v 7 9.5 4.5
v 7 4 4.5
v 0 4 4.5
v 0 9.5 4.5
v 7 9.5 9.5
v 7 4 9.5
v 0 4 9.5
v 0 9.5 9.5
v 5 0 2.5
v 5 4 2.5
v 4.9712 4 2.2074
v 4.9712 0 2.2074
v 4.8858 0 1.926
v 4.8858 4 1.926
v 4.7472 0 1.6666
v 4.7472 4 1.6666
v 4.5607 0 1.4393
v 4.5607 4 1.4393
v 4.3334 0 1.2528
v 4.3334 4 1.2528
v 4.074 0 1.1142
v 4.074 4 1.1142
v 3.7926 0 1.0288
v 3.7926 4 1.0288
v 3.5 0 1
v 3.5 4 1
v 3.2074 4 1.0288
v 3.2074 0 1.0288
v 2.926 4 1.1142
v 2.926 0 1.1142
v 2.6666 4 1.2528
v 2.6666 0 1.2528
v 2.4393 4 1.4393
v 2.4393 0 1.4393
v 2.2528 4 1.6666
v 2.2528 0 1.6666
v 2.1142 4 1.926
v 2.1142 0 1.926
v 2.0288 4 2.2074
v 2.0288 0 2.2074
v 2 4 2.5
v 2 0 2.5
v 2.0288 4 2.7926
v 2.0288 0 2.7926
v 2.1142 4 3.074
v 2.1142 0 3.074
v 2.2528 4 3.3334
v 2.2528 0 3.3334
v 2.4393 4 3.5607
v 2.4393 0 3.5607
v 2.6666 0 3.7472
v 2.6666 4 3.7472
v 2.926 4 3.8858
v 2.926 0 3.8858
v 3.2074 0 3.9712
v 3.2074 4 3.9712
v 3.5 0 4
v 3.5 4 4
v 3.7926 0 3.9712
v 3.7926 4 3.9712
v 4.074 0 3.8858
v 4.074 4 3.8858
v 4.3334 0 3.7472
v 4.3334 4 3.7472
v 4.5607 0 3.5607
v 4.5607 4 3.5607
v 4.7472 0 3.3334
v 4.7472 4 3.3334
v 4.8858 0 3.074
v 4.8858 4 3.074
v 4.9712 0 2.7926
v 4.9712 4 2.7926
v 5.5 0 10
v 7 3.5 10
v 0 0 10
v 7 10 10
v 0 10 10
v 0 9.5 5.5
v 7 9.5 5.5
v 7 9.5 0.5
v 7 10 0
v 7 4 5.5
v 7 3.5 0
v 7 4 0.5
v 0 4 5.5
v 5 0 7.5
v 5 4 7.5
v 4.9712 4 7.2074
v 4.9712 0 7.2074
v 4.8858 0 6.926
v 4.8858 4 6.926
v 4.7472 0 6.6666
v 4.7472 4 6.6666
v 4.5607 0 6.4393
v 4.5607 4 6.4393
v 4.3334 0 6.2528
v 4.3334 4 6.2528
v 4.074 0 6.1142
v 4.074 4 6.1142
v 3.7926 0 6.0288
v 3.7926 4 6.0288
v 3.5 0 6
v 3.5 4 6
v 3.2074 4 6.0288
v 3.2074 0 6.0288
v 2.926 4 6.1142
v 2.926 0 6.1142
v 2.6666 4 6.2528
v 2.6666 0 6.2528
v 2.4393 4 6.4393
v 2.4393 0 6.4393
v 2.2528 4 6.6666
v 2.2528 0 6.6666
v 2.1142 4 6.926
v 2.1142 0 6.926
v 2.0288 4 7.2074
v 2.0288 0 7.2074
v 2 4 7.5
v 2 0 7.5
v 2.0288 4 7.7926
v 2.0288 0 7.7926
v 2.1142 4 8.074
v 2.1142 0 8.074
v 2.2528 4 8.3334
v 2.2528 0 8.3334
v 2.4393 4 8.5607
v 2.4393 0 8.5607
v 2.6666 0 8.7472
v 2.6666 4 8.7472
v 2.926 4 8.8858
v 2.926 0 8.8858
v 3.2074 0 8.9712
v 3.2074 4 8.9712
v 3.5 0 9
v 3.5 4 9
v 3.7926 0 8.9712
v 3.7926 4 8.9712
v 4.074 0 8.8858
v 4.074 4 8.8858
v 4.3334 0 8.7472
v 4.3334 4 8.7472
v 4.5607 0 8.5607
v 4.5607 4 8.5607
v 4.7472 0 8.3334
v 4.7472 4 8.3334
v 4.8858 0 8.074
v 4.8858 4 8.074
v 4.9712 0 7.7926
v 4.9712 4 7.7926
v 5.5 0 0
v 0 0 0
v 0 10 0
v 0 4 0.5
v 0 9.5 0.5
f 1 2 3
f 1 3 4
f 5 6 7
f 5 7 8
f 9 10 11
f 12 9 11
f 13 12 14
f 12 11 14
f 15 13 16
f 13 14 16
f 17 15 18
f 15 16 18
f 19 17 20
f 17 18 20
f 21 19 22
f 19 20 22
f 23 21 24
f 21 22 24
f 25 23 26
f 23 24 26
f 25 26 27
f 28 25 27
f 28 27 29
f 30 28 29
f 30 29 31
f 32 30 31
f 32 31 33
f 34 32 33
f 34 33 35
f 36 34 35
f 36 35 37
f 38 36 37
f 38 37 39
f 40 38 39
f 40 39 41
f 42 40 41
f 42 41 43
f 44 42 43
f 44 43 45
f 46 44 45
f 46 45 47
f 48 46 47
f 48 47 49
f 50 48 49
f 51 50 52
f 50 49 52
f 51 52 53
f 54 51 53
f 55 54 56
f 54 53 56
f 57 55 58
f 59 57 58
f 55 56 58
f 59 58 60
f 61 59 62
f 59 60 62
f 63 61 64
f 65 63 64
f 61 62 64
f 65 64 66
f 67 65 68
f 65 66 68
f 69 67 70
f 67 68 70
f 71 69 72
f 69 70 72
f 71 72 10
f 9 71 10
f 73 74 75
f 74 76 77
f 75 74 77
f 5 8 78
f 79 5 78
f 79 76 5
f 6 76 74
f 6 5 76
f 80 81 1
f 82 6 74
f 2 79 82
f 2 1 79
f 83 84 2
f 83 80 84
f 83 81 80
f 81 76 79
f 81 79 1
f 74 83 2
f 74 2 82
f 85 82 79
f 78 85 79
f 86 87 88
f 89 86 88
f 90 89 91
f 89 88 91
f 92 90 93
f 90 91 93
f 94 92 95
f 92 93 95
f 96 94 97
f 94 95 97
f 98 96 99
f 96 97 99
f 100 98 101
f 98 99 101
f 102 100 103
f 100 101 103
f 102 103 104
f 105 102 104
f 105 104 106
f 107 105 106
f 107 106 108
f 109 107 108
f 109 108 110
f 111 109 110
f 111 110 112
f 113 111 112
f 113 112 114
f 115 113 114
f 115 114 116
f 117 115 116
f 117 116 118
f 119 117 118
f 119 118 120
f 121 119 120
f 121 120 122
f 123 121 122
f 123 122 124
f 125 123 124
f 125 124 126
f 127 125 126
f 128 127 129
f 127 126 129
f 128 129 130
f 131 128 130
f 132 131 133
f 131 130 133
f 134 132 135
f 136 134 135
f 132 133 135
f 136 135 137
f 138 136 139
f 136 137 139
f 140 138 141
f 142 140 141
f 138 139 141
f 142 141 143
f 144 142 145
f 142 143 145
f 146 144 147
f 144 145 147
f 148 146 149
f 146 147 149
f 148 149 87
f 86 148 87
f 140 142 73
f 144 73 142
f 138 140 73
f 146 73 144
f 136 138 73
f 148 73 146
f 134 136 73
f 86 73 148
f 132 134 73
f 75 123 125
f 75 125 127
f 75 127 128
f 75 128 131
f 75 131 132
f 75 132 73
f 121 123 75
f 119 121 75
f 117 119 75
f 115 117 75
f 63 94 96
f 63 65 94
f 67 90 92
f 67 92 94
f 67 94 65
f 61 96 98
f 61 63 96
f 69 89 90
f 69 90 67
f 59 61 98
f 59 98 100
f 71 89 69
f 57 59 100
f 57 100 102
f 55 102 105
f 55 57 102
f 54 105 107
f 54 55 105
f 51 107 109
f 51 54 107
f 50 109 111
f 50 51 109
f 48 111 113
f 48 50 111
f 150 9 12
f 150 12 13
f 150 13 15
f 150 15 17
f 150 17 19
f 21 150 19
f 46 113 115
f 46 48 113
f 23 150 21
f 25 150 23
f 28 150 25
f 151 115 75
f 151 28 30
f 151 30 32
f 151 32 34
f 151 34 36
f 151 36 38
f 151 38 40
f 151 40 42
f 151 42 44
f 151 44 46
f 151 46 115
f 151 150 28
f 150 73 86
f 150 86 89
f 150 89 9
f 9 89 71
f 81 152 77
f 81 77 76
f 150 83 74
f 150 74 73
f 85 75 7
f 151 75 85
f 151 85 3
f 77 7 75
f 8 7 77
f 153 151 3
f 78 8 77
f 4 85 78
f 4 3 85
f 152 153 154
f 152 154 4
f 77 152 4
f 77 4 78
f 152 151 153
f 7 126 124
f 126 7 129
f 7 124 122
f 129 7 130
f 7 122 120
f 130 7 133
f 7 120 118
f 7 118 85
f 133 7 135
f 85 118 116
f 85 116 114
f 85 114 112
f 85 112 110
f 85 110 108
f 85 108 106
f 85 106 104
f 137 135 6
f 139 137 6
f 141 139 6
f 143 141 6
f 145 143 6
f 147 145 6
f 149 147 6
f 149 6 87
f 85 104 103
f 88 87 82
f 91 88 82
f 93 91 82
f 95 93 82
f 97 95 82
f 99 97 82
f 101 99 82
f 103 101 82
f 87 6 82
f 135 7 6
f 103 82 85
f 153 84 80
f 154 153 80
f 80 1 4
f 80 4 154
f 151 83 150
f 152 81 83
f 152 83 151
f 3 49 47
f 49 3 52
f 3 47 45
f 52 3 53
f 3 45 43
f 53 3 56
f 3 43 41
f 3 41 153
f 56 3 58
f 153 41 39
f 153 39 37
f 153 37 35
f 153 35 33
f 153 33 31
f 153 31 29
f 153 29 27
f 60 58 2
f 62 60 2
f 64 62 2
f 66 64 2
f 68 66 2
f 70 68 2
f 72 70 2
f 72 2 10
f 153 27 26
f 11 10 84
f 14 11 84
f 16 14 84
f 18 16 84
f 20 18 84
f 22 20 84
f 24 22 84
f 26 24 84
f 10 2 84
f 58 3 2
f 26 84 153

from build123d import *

# Parameters (mm, degrees)
BOSS_EXTRUDE1_DEPTH = 10
CUT_EXTRUDE1_REACH  = 9
SKETCH2_W           = 4
SKETCH2_H           = 5.5
CUT_EXTRUDE2_REACH  = 6
SKETCH3_R           = 1.5


with BuildPart() as part:
    # Sketch1 → Boss-Extrude1 (new body)
    with BuildSketch(Plane.XY):
        Polygon((0, 0), (0, 10), (7, 10), (7, 3.5), (5.5, 0), align=None)
    extrude(amount=BOSS_EXTRUDE1_DEPTH)

    # Sketch2 → Cut-Extrude1 (cut, up to next)
    with BuildSketch(Plane(origin=(7, 0, 0), x_dir=(0, 0, -1), z_dir=(1, 0, 0)), mode=Mode.PRIVATE) as cut_extrude1_sk1:
        with Locations((-7.5, 6.75)):
            Rectangle(SKETCH2_W, SKETCH2_H)
    cut_extrude1_tool1 = extrude(cut_extrude1_sk1.sketch, amount=-CUT_EXTRUDE1_REACH, mode=Mode.PRIVATE) & part.part
    add(cut_extrude1_tool1.solids().sort_by_distance((7, 6.75, 7.5))[0], mode=Mode.SUBTRACT)
    # Sketch2 → Cut-Extrude1 (cut, up to next)
    with BuildSketch(Plane(origin=(7, 0, 0), x_dir=(0, 0, -1), z_dir=(1, 0, 0)), mode=Mode.PRIVATE) as cut_extrude1_sk2:
        with Locations((-2.5, 6.75)):
            Rectangle(SKETCH2_W, SKETCH2_H)
    cut_extrude1_tool2 = extrude(cut_extrude1_sk2.sketch, amount=-CUT_EXTRUDE1_REACH, mode=Mode.PRIVATE) & part.part
    add(cut_extrude1_tool2.solids().sort_by_distance((7, 6.75, 2.5))[0], mode=Mode.SUBTRACT)

    # Sketch3 → Cut-Extrude2 (cut, up to next)
    with BuildSketch(Plane(origin=(0, 4, 0), x_dir=(1, 0, 0), z_dir=(0, 1, 0)), mode=Mode.PRIVATE) as cut_extrude2_sk1:
        with Locations((3.5, -2.5)):
            Circle(SKETCH3_R)
    cut_extrude2_tool1 = extrude(cut_extrude2_sk1.sketch, amount=-CUT_EXTRUDE2_REACH, mode=Mode.PRIVATE) & part.part
    add(cut_extrude2_tool1.solids().sort_by_distance((3.5, 4, 2.5))[0], mode=Mode.SUBTRACT)
    # Sketch3 → Cut-Extrude2 (cut, up to next)
    with BuildSketch(Plane(origin=(0, 4, 0), x_dir=(1, 0, 0), z_dir=(0, 1, 0)), mode=Mode.PRIVATE) as cut_extrude2_sk2:
        with Locations((3.5, -7.5)):
            Circle(SKETCH3_R)
    cut_extrude2_tool2 = extrude(cut_extrude2_sk2.sketch, amount=-CUT_EXTRUDE2_REACH, mode=Mode.PRIVATE) & part.part
    add(cut_extrude2_tool2.solids().sort_by_distance((3.5, 4, 7.5))[0], mode=Mode.SUBTRACT)


solid = part.part
